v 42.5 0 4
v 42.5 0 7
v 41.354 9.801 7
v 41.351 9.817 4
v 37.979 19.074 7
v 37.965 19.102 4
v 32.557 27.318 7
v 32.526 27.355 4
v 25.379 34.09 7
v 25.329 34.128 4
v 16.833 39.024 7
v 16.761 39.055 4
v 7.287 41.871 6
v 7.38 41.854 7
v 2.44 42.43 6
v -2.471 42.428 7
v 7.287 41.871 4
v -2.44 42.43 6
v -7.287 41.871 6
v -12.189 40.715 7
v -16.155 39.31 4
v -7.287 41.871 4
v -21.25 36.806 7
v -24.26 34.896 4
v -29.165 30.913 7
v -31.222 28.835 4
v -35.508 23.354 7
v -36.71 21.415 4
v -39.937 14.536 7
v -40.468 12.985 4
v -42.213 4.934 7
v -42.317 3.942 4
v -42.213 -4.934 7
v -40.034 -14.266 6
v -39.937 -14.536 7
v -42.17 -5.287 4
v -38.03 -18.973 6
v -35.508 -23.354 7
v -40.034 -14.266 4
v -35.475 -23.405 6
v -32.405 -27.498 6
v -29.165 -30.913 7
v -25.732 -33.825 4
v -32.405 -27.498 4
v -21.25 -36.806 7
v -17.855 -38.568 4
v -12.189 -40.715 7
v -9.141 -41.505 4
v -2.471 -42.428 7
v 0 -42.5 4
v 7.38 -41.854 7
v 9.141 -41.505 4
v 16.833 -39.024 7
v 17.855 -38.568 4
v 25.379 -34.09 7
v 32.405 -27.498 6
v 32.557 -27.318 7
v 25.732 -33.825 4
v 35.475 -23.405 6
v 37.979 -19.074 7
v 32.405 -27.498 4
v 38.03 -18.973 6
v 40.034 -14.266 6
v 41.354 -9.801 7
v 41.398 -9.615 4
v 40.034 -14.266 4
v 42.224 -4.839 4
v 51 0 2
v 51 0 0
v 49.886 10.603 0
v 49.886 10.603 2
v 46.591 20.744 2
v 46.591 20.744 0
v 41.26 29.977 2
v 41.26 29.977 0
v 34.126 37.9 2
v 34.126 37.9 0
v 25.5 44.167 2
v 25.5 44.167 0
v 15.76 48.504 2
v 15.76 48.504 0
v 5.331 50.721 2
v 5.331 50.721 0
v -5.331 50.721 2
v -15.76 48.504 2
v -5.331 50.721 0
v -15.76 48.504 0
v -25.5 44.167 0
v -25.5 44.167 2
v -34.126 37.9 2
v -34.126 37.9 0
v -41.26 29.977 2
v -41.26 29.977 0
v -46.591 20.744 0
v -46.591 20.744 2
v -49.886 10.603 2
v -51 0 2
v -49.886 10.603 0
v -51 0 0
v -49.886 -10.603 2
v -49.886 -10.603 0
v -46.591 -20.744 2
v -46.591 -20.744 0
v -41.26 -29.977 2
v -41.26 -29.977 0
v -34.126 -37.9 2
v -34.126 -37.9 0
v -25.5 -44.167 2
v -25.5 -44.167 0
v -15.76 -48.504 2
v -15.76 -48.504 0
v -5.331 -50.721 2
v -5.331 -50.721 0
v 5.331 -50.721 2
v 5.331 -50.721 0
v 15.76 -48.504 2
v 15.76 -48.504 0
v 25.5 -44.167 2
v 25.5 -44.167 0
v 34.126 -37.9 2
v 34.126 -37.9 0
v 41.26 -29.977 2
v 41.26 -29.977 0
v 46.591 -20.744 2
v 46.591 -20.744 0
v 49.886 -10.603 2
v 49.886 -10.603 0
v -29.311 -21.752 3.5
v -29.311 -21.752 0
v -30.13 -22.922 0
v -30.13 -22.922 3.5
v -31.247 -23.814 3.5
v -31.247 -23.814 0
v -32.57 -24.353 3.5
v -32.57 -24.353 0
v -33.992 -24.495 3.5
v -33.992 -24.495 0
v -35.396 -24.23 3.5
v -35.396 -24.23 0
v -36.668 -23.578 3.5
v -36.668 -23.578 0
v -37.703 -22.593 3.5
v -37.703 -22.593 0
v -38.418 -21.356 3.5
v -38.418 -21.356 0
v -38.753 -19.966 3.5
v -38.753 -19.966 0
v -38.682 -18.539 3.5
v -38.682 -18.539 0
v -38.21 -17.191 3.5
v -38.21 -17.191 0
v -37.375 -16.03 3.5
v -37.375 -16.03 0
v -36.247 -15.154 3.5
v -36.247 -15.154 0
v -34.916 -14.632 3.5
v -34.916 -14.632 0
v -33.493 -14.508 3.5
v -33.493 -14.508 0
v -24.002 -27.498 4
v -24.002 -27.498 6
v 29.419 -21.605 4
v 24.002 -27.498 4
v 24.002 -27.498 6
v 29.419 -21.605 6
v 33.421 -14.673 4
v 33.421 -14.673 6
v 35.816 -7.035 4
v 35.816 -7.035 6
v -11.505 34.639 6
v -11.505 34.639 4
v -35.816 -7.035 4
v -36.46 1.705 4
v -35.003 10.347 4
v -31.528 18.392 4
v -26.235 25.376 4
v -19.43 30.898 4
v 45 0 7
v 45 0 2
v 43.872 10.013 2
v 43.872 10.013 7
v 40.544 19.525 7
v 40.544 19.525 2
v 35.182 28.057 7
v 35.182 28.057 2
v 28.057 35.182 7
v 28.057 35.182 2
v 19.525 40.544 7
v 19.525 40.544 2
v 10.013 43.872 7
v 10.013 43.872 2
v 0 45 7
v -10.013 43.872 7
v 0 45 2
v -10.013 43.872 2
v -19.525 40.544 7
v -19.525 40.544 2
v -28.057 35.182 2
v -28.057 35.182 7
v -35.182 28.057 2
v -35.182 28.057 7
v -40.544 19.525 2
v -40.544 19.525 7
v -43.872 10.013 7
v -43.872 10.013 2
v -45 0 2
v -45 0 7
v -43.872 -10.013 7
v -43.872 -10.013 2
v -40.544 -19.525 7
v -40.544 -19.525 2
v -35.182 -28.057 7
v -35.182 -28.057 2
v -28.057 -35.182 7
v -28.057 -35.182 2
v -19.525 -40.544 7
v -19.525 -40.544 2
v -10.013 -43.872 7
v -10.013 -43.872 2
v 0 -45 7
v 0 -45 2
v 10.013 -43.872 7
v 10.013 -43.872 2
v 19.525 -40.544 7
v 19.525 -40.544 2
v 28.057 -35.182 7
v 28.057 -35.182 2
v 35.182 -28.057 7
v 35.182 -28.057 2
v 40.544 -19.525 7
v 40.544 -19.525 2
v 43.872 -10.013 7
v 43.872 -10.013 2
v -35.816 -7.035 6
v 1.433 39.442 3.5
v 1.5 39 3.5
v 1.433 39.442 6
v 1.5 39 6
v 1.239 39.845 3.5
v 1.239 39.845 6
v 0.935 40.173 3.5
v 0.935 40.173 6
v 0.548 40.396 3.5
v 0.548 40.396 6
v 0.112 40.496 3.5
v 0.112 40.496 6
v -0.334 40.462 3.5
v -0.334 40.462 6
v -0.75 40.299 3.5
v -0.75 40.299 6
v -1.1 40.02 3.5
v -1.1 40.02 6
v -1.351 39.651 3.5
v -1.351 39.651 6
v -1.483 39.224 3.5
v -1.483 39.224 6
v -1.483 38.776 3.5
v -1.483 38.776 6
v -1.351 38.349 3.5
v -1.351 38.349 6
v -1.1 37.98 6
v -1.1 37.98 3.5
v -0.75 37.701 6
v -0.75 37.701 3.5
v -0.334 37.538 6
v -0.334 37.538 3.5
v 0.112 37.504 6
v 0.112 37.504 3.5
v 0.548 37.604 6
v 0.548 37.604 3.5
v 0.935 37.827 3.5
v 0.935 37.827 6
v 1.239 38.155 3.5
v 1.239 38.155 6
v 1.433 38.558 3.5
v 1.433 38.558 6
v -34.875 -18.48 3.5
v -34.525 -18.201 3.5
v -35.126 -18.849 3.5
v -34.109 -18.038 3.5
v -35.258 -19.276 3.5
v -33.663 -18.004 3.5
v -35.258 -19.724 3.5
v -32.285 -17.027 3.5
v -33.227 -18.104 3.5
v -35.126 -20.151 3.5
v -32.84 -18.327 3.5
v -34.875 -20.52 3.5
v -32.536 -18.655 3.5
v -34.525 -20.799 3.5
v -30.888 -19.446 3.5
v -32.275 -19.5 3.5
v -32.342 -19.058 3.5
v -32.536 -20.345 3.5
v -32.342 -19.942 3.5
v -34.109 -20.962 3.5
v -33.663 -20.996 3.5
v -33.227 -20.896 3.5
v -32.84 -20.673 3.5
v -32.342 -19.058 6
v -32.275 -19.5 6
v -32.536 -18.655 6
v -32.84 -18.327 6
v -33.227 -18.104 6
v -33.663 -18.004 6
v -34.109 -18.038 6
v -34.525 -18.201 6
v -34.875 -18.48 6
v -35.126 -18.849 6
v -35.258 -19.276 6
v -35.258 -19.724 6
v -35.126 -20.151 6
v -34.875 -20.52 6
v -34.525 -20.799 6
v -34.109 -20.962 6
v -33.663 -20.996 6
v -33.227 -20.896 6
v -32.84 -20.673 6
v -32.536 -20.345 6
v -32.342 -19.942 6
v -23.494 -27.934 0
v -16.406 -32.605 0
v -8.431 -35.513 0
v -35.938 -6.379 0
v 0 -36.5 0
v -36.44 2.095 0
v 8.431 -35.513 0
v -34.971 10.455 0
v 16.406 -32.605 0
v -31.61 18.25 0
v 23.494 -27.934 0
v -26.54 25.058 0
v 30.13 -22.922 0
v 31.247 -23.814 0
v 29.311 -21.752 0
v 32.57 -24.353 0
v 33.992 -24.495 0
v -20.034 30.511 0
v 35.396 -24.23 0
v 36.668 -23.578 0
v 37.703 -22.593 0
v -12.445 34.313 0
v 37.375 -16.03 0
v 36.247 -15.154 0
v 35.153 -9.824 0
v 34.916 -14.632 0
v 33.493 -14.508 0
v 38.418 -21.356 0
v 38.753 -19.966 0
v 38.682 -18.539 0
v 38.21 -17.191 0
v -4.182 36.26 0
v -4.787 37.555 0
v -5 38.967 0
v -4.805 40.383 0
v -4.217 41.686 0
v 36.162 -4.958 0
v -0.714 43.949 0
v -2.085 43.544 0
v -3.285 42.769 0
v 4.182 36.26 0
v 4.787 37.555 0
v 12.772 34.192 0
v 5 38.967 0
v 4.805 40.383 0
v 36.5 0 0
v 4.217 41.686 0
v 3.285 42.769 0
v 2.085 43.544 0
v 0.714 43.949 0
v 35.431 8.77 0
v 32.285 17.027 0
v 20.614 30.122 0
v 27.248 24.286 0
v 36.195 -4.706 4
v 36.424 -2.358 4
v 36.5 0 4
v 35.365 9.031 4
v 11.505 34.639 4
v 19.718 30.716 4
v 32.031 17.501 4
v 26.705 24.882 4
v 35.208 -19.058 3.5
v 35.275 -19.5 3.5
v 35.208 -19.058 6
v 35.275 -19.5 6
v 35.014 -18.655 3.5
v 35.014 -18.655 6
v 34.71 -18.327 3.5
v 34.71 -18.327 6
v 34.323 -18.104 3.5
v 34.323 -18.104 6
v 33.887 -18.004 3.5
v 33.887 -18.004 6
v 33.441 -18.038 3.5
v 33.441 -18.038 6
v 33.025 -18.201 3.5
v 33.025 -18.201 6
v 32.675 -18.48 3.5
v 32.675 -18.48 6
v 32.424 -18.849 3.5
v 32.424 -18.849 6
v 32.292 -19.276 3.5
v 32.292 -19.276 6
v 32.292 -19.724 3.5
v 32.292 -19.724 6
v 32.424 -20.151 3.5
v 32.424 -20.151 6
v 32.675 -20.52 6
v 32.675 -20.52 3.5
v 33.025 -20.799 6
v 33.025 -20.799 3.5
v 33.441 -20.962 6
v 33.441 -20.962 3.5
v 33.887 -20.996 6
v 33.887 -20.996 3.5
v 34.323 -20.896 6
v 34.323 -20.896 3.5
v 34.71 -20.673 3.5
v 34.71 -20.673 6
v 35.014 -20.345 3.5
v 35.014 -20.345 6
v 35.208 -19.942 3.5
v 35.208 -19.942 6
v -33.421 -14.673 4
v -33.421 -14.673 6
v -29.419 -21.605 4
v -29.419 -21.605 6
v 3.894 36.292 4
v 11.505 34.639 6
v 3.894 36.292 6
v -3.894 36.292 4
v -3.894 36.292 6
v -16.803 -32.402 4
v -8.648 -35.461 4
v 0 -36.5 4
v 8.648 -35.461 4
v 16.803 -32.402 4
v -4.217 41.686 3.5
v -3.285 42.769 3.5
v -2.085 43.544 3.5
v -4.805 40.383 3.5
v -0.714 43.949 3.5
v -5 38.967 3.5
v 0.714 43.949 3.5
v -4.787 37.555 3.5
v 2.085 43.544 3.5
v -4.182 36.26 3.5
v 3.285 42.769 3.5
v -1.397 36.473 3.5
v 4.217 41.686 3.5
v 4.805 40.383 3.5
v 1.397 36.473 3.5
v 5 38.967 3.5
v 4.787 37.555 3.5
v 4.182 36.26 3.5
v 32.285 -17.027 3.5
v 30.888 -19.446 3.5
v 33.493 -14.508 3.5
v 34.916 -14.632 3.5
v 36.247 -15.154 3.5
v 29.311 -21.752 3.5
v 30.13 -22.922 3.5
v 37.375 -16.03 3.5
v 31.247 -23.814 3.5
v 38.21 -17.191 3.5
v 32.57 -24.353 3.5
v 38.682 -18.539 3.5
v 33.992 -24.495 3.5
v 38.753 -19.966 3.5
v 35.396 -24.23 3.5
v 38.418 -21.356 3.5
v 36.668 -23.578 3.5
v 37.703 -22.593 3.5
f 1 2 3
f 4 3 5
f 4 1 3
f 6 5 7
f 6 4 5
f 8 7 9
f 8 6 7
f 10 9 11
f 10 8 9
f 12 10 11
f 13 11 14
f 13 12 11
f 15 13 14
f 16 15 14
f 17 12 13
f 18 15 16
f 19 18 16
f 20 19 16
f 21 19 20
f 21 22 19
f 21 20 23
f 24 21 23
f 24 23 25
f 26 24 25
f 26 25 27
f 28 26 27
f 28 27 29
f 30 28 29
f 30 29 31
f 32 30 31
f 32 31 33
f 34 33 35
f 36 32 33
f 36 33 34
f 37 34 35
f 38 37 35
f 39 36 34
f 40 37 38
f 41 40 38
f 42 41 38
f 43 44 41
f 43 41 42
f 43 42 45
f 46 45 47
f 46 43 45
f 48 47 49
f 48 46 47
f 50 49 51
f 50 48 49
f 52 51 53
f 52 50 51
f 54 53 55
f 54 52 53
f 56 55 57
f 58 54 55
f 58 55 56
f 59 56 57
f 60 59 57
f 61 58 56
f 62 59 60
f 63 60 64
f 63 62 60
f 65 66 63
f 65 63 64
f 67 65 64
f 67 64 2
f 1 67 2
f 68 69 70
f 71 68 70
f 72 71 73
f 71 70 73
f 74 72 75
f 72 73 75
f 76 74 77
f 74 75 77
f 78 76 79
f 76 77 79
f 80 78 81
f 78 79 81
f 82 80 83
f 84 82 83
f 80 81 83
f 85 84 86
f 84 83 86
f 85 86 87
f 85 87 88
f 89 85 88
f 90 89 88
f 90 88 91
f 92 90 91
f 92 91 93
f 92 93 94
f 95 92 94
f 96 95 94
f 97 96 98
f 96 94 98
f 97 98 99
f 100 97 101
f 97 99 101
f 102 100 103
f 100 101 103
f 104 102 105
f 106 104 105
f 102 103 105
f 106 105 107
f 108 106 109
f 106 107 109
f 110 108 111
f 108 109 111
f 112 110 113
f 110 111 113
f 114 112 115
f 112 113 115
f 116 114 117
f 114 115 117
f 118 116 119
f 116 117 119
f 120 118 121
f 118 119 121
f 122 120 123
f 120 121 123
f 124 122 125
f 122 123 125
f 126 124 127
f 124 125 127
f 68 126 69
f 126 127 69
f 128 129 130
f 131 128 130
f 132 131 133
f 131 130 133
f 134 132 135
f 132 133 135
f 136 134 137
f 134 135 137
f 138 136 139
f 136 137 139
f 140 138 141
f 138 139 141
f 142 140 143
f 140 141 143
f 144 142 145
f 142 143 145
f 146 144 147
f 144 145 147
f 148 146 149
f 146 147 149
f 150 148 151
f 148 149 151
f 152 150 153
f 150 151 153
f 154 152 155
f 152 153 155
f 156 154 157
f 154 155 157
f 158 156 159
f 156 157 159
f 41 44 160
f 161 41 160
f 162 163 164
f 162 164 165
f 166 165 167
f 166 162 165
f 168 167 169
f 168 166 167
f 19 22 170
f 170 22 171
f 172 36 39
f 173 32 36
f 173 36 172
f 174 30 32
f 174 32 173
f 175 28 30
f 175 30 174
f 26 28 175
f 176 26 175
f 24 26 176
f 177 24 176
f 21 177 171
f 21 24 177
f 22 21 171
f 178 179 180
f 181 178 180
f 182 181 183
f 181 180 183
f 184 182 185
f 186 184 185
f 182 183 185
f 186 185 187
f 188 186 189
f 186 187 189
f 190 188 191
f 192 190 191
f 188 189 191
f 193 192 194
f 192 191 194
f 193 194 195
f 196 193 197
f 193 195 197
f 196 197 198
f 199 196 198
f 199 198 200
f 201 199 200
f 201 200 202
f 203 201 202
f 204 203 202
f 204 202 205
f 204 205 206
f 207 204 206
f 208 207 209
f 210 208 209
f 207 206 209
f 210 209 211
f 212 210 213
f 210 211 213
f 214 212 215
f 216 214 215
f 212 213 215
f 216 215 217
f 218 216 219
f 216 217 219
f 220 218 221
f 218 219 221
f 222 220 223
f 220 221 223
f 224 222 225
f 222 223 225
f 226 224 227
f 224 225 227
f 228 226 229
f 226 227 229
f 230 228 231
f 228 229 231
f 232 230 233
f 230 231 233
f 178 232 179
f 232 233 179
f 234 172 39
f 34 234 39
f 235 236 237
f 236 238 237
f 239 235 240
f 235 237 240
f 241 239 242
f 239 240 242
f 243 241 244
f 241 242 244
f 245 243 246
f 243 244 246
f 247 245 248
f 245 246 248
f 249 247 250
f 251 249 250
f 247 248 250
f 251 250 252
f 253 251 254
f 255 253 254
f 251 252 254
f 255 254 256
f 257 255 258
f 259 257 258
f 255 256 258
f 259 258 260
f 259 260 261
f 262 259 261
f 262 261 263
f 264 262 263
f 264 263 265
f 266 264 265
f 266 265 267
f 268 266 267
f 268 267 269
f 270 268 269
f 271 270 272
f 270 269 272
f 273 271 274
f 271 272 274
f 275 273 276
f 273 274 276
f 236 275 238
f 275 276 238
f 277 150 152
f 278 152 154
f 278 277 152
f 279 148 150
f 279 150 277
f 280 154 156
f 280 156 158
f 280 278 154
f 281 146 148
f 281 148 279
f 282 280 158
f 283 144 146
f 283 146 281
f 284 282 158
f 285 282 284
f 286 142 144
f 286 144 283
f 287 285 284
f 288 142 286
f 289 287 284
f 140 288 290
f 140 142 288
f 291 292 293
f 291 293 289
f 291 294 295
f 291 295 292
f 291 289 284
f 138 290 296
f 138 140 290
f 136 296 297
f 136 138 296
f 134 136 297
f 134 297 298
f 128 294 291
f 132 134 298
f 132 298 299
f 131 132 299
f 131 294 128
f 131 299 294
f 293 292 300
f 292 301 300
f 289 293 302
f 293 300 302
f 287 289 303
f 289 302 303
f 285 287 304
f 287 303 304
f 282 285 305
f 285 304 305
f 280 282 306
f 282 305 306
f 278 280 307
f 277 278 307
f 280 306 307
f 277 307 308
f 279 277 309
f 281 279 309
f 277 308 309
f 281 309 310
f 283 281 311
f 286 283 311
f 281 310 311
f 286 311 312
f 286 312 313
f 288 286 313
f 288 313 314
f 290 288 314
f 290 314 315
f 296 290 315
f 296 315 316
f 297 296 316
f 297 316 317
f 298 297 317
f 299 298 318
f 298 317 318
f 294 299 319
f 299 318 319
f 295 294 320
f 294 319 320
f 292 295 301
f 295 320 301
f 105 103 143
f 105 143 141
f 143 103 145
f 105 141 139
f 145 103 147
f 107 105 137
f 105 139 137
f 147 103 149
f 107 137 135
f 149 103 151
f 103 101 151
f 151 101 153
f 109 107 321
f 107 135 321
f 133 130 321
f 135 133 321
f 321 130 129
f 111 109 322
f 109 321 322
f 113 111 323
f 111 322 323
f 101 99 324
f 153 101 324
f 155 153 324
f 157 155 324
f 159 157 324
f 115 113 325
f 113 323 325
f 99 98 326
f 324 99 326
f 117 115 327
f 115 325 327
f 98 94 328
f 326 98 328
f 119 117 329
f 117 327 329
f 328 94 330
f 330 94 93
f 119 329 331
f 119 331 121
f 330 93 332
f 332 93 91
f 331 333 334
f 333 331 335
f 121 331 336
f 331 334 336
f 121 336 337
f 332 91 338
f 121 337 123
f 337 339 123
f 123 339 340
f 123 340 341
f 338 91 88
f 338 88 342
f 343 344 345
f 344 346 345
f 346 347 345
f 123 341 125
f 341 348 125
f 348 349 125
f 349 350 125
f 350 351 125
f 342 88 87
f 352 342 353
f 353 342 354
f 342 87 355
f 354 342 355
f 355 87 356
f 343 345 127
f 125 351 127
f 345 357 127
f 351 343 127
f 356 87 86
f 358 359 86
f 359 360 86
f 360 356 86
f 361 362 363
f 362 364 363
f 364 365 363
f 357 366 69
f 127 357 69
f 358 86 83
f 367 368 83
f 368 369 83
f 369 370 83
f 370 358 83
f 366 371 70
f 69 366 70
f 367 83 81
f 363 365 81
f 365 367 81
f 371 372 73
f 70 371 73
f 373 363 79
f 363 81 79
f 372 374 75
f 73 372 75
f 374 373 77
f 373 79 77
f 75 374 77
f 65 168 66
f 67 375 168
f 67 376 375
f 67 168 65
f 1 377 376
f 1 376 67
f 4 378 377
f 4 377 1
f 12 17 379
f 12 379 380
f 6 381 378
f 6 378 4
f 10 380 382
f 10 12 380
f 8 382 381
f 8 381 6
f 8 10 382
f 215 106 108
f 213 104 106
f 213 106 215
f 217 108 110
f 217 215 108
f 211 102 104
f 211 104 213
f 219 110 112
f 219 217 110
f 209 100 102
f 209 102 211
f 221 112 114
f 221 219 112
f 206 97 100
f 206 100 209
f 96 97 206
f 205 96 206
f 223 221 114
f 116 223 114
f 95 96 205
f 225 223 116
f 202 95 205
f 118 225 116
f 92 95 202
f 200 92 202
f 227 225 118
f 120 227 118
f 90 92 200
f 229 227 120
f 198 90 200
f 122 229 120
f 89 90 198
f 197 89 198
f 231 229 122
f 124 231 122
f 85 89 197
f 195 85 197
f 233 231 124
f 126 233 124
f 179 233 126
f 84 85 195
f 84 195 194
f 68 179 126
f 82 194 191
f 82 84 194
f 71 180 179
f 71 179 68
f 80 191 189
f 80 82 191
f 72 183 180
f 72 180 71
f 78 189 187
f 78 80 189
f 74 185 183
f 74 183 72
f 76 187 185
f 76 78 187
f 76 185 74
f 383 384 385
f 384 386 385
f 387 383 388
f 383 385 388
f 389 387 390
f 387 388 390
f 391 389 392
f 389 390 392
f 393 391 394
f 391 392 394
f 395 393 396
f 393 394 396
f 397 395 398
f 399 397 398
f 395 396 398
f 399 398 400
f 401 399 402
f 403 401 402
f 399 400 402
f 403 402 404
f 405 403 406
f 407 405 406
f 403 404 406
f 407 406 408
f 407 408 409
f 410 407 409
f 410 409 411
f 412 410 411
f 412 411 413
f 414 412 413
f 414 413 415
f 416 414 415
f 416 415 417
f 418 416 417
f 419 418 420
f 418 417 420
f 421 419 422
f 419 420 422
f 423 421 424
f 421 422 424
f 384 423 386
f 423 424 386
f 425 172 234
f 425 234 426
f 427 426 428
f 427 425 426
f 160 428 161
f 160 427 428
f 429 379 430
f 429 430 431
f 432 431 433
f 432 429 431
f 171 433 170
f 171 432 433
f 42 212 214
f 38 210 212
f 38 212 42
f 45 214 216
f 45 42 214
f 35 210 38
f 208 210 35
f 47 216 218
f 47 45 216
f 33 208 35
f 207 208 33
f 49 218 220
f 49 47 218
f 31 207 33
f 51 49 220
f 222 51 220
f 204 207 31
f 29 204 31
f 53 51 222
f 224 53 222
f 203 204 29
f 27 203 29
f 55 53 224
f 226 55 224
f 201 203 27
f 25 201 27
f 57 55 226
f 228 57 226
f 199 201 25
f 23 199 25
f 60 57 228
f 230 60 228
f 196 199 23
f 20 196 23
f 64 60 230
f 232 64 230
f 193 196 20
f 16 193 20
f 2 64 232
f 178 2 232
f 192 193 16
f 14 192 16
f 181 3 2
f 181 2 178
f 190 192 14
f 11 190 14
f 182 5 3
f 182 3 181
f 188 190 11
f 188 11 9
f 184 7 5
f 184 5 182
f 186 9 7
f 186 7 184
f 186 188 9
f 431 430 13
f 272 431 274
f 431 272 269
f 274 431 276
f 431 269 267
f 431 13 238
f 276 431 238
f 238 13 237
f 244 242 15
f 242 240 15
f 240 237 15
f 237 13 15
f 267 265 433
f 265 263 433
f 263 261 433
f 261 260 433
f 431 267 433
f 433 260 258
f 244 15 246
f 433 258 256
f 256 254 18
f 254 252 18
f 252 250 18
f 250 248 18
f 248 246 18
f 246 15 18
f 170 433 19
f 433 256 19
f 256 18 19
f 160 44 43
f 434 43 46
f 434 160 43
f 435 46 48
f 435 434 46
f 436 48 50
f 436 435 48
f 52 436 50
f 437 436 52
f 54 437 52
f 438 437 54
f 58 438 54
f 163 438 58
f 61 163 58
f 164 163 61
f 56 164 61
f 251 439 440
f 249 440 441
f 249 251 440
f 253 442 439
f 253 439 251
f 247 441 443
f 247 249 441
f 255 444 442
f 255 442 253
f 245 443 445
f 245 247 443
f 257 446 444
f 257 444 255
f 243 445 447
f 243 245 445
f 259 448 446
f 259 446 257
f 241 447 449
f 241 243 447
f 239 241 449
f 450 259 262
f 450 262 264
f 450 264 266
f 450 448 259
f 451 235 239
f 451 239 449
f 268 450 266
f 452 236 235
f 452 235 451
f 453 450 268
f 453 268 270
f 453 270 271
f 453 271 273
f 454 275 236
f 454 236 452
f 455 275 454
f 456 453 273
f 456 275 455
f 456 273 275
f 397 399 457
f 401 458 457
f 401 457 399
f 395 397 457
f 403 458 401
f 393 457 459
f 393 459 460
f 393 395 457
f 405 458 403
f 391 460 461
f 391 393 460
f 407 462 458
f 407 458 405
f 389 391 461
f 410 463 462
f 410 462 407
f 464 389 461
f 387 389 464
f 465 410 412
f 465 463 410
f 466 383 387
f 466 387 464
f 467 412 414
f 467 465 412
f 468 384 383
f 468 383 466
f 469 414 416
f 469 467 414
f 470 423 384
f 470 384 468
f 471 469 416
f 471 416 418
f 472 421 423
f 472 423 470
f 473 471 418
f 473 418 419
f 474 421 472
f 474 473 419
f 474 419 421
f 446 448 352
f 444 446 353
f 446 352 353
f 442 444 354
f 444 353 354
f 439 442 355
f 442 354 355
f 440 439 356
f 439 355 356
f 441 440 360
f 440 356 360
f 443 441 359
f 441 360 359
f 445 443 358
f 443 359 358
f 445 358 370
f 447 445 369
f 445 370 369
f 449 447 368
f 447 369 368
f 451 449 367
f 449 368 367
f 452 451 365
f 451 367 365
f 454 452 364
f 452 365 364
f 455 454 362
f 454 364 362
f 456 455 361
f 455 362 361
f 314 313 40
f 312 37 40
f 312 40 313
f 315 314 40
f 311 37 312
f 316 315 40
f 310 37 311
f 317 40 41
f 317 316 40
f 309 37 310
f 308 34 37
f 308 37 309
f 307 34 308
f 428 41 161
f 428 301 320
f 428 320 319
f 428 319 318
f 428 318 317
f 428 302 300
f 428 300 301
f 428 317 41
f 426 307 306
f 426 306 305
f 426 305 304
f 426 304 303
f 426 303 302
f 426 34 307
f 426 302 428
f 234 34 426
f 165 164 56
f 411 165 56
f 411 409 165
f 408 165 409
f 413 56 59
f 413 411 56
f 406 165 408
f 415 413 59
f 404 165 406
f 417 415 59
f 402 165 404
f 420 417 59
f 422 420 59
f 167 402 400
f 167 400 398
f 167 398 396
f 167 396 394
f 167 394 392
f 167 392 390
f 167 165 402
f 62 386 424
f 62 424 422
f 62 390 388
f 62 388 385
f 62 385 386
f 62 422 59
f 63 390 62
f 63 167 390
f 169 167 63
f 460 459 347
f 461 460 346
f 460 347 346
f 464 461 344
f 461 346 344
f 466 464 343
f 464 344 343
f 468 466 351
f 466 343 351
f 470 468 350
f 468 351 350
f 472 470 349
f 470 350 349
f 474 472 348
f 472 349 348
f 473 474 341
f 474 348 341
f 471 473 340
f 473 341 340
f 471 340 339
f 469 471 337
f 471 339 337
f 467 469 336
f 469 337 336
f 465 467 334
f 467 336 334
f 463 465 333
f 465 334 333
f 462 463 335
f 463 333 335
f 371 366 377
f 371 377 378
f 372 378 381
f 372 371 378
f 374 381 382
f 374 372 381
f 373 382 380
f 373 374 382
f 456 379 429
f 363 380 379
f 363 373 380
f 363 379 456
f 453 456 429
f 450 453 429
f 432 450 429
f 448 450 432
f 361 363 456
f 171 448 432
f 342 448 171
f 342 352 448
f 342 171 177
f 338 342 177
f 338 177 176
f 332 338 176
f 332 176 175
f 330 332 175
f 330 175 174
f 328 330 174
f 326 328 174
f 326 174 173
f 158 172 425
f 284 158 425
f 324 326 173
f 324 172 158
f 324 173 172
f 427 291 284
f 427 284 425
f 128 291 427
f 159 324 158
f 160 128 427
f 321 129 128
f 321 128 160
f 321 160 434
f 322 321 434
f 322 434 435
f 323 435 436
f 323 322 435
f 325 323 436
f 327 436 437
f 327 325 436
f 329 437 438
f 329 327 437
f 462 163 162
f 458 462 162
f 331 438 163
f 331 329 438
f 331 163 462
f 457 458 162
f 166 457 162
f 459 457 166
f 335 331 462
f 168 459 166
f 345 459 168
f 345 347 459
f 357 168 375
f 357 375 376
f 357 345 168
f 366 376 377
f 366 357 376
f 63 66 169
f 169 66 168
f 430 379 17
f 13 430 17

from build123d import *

# Parameters (mm, degrees)
SKETCH_R          = 51
SKETCH_R_2        = 36.5
PAD_DEPTH         = 2
SKETCH001_R       = 45
SKETCH001_R_2     = 42.5
PAD001_DEPTH      = 5
SKETCH002_R       = 43
SKETCH002_R_2     = 36.5
PAD002_DEPTH      = 2
SKETCH004_R       = 5
POCKET001_DEPTH   = 3.5
PAD003_DEPTH      = 2
SKETCH003_R       = 1.5
POCKET_DEPTH      = 4.001
POCKET_DEPTH_BACK = 3.001


with BuildPart() as part:
    # Sketch → Pad (new body)
    with BuildSketch(Plane.XY):
        Circle(SKETCH_R)
        Circle(SKETCH_R_2, mode=Mode.SUBTRACT)
    extrude(amount=PAD_DEPTH)

    # Sketch001 (on Face4 of Pad) → Pad001 (join)
    with BuildSketch(Plane.XY.offset(2)):
        Circle(SKETCH001_R)
        Circle(SKETCH001_R_2, mode=Mode.SUBTRACT)
    extrude(amount=PAD001_DEPTH)

    # Sketch002 (on Face6 of Pad001) → Pad002 (join)
    with BuildSketch(Plane.XY.offset(2)):
        Circle(SKETCH002_R)
        Circle(SKETCH002_R_2, mode=Mode.SUBTRACT)
    extrude(amount=PAD002_DEPTH)

    # Sketch004 → Pocket001 (cut)
    with BuildSketch(Plane(origin=(0, 0, 0), x_dir=(1, 0, 0), z_dir=(0, 0, -1))):
        with Locations((33.7749907476, 19.5)):
            Circle(SKETCH004_R)
        with Locations((-33.7749907476, 19.5)):
            Circle(SKETCH004_R)
        with Locations((0, -39)):
            Circle(SKETCH004_R)
    extrude(amount=-POCKET001_DEPTH, mode=Mode.SUBTRACT)

    # Sketch005 (on Face19 of Pocket001) → Pad003 (join)
    with BuildSketch(Plane.XY.offset(4)):
        with BuildLine():
            ThreePointArc((11.5051886068, 34.6392932249), (-0.0001407701, 36.4999999997), (-11.5054557942, 34.6392044794))
            Line((-7.2870367194, 41.8706233038), (-11.5054557942, 34.6392044794))
            ThreePointArc((7.2867818781, 41.8706676548), (-0.0001293359, 42.4999999998), (-7.2870367194, 41.8706233038))
            Line((11.5051886068, 34.6392932249), (7.2867818781, 41.8706676548))
        make_face()
        with BuildLine():
            ThreePointArc((-40.0341199475, -14.2660169643), (-36.8189826795, -21.2276356301), (-32.4052284347, -27.4982030339))
            Line((-32.4052284347, -27.4982030339), (-24.0020588681, -27.4982030339))
            ThreePointArc((-35.8157008728, -7.0345981399), (-31.6106133509, -18.2488115663), (-24.0020588681, -27.4982030339))
            Line((-35.8157008728, -7.0345981399), (-40.0341199475, -14.2660169643))
        make_face()
        with BuildLine():
            Line((40.0340730114, -14.2661486785), (35.8156662827, -7.0347742486))
            ThreePointArc((24.0020588681, -27.4982030339), (31.6105684853, -18.2488892822), (35.8156662827, -7.0347742486))
            Line((24.0020588681, -27.4982030339), (32.4052284347, -27.4982030339))
            ThreePointArc((32.4052284347, -27.4982030339), (36.8189477595, -21.2276961982), (40.0340730114, -14.2661486785))
        make_face()
    extrude(amount=PAD003_DEPTH)

    # Sketch003 (on Face8 of Pad002) → Pocket (cut, two sides)
    with BuildSketch(Plane.XY.offset(4)) as pocket_sk:
        with Locations((0, 39)):
            Circle(SKETCH003_R)
        with Locations((33.7749907476, -19.5)):
            Circle(SKETCH003_R)
        with Locations((-33.7749907476, -19.5)):
            Circle(SKETCH003_R)
    extrude(amount=-POCKET_DEPTH, mode=Mode.SUBTRACT)
    extrude(pocket_sk.sketch, amount=POCKET_DEPTH_BACK, mode=Mode.SUBTRACT)


solid = part.part
